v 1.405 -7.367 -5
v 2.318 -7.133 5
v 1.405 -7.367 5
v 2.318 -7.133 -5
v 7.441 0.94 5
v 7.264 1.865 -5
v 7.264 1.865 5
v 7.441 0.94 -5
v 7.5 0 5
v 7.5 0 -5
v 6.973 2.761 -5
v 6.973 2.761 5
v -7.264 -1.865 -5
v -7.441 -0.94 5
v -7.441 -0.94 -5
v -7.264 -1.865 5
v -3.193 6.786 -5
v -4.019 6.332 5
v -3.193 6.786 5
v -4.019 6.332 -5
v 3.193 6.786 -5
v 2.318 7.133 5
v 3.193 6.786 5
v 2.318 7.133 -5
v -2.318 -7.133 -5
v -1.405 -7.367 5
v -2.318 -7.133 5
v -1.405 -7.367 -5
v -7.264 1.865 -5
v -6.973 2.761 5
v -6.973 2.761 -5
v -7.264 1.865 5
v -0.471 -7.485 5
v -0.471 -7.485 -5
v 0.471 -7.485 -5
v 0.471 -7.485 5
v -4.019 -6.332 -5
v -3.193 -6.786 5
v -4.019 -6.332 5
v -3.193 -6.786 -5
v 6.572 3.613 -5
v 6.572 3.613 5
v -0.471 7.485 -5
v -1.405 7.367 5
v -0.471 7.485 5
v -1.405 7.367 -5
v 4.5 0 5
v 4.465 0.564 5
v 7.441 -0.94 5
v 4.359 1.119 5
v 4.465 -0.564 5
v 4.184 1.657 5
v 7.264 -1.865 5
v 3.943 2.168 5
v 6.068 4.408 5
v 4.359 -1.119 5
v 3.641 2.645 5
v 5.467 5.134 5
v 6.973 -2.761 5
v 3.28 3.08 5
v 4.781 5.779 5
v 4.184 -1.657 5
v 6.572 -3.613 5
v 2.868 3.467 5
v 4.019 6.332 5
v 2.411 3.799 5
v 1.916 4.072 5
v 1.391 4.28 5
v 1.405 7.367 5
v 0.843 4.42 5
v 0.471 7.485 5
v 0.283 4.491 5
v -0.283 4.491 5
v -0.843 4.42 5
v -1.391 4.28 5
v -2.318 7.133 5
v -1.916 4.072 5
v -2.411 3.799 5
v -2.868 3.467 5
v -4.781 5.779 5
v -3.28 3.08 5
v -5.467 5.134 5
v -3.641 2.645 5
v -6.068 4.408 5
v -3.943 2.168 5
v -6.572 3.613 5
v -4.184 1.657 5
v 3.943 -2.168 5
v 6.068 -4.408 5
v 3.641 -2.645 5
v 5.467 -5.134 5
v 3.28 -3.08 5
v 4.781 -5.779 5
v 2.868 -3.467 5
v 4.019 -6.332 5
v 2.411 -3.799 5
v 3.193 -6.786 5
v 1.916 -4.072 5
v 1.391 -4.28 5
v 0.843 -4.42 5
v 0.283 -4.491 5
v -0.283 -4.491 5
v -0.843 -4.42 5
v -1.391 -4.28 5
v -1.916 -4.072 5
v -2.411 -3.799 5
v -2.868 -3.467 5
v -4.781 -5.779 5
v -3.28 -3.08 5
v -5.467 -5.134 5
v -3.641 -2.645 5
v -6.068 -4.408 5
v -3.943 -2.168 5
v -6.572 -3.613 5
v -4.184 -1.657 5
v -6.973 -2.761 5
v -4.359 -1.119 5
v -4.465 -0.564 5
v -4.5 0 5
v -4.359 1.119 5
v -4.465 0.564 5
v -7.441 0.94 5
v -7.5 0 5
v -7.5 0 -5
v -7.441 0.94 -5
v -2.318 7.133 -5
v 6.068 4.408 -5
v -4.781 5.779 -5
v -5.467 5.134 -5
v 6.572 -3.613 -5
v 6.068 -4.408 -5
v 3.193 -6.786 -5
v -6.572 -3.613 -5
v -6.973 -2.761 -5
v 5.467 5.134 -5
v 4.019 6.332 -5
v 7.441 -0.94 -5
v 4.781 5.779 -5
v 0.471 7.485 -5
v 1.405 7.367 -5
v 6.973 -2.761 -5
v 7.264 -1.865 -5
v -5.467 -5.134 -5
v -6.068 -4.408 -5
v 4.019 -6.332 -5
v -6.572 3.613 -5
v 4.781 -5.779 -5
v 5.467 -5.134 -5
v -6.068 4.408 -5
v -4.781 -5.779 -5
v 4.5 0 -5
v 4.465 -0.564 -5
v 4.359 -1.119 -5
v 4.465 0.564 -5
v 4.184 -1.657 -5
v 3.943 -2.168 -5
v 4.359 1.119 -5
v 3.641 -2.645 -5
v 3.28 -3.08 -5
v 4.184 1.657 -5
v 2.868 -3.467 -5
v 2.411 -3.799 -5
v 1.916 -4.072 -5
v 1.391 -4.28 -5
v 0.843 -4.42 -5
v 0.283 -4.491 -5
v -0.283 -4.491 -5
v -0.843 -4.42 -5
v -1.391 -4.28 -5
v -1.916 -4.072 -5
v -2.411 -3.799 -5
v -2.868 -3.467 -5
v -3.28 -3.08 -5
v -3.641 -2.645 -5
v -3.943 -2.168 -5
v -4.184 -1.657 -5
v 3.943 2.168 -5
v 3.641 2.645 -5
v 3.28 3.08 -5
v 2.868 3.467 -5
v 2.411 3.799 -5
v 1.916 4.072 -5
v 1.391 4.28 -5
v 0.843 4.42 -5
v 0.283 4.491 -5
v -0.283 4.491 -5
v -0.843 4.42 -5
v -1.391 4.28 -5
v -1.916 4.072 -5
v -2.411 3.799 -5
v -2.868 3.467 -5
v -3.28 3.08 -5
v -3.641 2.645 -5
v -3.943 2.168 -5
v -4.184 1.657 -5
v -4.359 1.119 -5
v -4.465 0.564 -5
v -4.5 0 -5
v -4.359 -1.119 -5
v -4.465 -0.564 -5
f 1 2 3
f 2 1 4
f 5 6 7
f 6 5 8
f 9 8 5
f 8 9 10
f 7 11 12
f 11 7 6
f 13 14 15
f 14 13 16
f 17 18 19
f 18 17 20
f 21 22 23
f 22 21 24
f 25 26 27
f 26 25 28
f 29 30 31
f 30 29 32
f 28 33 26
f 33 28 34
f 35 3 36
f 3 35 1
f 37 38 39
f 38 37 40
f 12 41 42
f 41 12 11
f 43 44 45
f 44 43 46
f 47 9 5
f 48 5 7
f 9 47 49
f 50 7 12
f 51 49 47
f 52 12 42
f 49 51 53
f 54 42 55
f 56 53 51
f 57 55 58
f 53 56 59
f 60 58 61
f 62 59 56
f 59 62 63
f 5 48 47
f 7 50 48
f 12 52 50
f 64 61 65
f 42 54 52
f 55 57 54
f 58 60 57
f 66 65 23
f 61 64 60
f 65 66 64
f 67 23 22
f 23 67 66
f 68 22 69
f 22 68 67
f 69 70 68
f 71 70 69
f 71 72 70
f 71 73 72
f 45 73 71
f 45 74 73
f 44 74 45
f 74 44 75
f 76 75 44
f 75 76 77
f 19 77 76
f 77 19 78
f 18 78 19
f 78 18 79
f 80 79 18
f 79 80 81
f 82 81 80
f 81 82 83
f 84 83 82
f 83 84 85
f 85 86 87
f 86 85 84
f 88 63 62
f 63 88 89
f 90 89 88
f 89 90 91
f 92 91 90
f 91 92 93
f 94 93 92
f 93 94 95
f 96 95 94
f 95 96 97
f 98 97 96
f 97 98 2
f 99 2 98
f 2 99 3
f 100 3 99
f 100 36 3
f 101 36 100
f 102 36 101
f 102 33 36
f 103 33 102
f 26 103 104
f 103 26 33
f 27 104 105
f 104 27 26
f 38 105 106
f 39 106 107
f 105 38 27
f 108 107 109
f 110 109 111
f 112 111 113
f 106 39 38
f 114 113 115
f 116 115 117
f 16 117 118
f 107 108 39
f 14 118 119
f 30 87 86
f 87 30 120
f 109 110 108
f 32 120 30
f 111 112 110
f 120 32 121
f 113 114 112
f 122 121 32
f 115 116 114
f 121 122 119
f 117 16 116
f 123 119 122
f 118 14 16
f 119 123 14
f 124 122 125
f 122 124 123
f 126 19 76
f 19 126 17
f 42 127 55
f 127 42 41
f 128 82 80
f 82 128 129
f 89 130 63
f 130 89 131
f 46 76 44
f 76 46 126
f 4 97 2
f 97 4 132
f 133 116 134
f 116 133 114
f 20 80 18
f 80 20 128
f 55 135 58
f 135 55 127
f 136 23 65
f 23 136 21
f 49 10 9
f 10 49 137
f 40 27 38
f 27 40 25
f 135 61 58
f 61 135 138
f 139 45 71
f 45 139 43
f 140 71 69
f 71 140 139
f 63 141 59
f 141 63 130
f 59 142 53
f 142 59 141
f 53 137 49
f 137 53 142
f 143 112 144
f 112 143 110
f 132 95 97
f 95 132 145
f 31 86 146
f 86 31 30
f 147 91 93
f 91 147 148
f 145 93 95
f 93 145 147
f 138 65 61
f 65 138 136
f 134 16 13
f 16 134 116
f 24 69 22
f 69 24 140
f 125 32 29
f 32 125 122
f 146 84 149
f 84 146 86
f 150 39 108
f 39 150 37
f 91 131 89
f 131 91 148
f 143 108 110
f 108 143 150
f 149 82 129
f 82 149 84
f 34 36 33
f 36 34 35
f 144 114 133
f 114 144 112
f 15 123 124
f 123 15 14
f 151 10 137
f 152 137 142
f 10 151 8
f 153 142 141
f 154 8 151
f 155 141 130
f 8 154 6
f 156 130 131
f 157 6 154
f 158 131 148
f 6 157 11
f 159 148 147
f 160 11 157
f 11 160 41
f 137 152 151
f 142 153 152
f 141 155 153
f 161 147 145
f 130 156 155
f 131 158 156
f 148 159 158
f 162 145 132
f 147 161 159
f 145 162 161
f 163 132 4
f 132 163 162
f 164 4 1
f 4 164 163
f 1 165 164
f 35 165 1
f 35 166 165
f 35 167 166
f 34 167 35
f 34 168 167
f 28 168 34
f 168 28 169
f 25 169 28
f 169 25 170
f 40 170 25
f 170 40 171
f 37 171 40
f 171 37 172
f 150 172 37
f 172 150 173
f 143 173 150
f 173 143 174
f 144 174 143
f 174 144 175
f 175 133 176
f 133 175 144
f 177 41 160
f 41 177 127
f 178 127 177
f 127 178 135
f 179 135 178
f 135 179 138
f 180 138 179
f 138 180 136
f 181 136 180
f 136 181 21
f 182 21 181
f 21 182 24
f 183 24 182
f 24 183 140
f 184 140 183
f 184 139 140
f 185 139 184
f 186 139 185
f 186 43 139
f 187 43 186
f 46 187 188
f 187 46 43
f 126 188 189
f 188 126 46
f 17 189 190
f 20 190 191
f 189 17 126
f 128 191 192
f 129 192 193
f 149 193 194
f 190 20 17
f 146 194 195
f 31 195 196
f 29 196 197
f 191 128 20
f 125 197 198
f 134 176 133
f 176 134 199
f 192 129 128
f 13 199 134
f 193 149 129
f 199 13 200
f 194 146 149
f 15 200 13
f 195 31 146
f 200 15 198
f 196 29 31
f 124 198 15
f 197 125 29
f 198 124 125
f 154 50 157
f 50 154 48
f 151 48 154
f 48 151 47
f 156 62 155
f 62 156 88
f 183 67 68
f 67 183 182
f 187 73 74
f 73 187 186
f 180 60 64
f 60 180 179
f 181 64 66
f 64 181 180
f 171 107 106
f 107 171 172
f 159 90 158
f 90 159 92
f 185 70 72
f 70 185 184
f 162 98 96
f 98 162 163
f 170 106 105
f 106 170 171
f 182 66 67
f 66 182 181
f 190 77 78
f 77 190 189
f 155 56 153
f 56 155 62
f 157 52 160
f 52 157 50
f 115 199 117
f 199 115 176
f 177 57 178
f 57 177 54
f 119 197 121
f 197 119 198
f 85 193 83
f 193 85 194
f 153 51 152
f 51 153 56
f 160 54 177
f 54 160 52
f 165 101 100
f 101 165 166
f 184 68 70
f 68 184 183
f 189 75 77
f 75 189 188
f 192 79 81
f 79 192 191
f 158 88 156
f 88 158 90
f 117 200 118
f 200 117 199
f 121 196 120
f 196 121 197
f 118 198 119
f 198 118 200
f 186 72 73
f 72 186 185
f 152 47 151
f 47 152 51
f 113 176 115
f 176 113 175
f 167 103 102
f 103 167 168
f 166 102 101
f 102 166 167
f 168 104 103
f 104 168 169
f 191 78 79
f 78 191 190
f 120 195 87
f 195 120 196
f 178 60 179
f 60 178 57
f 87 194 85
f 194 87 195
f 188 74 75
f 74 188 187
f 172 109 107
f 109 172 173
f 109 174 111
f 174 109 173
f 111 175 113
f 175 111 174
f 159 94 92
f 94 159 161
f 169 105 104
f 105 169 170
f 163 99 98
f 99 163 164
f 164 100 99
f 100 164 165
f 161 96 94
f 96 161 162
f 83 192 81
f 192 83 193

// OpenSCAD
$fn = 50;


difference() {
	union() {
		translate(v = [0, 0, -5.0000000000]) {
			cylinder(h = 10, r = 7.5000000000);
		}
	}
	union() {
		translate(v = [0, 0, -100.0000000000]) {
			cylinder(h = 200, r = 4.5000000000);
		}
	}
}
